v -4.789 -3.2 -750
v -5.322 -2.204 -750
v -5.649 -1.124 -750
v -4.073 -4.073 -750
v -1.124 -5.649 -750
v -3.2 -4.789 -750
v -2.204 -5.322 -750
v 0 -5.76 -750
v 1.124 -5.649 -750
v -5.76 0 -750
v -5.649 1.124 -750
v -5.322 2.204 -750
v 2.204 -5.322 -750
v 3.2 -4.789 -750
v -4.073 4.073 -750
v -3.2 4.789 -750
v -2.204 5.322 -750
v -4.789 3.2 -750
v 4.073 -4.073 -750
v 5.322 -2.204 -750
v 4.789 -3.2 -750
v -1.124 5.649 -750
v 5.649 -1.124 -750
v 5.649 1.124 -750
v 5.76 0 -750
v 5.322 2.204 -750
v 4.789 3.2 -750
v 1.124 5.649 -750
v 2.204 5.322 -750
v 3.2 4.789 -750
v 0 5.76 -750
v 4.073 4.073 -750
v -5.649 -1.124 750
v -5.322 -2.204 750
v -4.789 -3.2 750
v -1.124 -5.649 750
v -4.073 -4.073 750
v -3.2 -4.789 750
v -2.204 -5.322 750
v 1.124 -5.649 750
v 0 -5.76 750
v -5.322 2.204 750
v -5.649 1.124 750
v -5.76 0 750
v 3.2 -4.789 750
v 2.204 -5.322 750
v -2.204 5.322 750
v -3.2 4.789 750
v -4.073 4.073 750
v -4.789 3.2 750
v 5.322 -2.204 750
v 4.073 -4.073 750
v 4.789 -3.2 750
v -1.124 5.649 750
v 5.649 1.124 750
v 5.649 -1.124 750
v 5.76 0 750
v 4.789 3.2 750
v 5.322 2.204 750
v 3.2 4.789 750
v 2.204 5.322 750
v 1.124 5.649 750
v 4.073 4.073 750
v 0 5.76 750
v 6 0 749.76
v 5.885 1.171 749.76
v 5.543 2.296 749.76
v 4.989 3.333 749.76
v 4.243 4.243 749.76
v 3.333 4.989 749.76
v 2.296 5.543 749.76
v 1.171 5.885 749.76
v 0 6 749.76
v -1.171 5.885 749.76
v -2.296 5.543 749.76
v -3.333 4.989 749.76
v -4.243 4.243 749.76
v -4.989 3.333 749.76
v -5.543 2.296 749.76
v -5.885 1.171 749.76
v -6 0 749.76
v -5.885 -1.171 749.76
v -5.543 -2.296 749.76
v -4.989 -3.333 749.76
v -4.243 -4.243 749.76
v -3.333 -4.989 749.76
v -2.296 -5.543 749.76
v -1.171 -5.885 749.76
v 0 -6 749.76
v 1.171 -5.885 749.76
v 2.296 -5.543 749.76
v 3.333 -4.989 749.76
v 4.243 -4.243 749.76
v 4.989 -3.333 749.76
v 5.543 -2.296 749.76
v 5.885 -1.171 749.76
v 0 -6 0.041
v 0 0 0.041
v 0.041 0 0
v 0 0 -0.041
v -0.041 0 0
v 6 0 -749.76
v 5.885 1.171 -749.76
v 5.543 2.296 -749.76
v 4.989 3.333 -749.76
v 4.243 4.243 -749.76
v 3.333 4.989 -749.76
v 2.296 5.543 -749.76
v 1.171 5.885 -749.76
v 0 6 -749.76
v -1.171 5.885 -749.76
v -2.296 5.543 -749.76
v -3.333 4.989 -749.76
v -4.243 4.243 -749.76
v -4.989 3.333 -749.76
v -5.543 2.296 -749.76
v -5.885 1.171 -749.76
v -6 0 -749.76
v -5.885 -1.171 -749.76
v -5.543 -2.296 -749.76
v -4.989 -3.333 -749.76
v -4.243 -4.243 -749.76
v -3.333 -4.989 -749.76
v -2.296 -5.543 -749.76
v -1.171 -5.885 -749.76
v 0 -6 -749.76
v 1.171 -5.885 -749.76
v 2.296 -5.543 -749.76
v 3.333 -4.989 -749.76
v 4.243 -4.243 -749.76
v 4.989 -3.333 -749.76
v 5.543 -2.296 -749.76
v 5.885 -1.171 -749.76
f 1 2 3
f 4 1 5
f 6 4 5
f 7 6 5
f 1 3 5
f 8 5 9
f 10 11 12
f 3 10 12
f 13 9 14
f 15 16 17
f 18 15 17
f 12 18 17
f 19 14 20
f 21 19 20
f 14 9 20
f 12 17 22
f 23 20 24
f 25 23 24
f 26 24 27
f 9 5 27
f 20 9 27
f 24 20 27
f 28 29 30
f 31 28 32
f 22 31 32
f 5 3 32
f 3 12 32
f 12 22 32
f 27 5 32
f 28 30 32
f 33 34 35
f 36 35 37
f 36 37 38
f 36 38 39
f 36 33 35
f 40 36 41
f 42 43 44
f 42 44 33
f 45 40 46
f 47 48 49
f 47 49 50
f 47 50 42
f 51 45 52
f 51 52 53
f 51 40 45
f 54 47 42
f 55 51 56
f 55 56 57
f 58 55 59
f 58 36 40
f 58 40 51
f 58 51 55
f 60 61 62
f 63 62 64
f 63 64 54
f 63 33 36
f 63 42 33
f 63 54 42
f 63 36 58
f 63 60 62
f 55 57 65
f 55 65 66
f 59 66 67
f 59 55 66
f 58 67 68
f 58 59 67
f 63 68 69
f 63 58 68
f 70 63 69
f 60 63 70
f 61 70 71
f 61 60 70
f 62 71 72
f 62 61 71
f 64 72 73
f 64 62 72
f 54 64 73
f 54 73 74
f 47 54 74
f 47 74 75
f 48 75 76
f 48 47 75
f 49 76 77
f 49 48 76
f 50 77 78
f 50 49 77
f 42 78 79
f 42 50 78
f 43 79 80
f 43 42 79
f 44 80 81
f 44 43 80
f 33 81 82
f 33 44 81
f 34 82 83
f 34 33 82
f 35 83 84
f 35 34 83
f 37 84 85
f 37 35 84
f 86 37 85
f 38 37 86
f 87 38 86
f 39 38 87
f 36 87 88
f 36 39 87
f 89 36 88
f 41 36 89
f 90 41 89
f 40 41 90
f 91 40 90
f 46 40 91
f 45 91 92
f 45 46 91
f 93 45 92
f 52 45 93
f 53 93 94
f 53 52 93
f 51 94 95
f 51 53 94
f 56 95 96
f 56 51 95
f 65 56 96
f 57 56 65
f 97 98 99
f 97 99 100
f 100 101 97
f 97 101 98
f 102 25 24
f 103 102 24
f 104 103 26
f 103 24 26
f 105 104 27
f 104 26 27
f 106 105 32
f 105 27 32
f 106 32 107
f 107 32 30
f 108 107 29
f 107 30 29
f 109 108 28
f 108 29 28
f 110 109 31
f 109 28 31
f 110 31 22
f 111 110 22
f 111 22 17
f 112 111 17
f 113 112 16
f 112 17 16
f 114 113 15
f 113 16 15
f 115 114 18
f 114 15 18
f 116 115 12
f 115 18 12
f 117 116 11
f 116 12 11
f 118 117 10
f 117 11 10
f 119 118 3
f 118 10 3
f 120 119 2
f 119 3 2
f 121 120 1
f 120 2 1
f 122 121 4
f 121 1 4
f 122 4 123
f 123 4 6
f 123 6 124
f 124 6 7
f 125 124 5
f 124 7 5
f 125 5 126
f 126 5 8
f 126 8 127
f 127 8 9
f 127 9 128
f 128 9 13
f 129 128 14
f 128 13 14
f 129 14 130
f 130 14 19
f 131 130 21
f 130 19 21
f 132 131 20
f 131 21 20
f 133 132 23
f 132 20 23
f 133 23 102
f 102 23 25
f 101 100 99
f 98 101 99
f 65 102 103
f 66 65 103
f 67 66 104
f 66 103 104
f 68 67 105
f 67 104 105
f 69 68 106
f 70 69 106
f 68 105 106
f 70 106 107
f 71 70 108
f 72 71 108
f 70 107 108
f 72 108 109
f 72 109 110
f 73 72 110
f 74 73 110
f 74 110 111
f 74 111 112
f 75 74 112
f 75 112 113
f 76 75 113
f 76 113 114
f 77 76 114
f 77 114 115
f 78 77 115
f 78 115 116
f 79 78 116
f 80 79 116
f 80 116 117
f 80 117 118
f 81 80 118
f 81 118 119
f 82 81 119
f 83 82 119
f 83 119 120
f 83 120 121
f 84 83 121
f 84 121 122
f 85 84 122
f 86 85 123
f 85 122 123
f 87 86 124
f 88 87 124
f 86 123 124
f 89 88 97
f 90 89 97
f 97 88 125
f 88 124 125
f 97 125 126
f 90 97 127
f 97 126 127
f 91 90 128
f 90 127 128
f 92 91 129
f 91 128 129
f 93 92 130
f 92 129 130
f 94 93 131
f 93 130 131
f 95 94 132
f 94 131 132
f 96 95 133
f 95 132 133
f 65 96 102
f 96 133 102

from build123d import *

# Parameters (mm, degrees)
BOSS_EXTRUDE1_DEPTH      = 750
BOSS_EXTRUDE1_DEPTH_BACK = 750
SKETCH3_R                = 6
CHAMFER1_SIZE            = 0.24
SKETCH5_R                = 0.04114626
CUT_EXTRUDE2_DEPTH       = 751.047998464


with BuildPart() as part:
    # Sketch3 → Boss-Extrude1 (new, two sides: drawn at the far end of the back side and taken through both)
    with BuildSketch(Plane.XY.offset(-BOSS_EXTRUDE1_DEPTH_BACK)):
        Circle(SKETCH3_R)
    extrude(amount=BOSS_EXTRUDE1_DEPTH + BOSS_EXTRUDE1_DEPTH_BACK)

    # Chamfer1
    chamfer1_edges = [part.edges().sort_by_distance(p)[0] for p in [
        (-6, 0, -750),
        (-6, 0, 750),
    ]]
    chamfer(chamfer1_edges, length=CHAMFER1_SIZE)

    # Sketch5 → Cut-Extrude2 (cut, through all)
    with BuildSketch(Plane(origin=(0, 0, 0), x_dir=(1, 0, 0), z_dir=(0, 1, 0))):
        with Locations(Location((0, 0, 0), (0, 0, 270))):
            Circle(SKETCH5_R)
    extrude(amount=-CUT_EXTRUDE2_DEPTH, mode=Mode.SUBTRACT)


solid = part.part
